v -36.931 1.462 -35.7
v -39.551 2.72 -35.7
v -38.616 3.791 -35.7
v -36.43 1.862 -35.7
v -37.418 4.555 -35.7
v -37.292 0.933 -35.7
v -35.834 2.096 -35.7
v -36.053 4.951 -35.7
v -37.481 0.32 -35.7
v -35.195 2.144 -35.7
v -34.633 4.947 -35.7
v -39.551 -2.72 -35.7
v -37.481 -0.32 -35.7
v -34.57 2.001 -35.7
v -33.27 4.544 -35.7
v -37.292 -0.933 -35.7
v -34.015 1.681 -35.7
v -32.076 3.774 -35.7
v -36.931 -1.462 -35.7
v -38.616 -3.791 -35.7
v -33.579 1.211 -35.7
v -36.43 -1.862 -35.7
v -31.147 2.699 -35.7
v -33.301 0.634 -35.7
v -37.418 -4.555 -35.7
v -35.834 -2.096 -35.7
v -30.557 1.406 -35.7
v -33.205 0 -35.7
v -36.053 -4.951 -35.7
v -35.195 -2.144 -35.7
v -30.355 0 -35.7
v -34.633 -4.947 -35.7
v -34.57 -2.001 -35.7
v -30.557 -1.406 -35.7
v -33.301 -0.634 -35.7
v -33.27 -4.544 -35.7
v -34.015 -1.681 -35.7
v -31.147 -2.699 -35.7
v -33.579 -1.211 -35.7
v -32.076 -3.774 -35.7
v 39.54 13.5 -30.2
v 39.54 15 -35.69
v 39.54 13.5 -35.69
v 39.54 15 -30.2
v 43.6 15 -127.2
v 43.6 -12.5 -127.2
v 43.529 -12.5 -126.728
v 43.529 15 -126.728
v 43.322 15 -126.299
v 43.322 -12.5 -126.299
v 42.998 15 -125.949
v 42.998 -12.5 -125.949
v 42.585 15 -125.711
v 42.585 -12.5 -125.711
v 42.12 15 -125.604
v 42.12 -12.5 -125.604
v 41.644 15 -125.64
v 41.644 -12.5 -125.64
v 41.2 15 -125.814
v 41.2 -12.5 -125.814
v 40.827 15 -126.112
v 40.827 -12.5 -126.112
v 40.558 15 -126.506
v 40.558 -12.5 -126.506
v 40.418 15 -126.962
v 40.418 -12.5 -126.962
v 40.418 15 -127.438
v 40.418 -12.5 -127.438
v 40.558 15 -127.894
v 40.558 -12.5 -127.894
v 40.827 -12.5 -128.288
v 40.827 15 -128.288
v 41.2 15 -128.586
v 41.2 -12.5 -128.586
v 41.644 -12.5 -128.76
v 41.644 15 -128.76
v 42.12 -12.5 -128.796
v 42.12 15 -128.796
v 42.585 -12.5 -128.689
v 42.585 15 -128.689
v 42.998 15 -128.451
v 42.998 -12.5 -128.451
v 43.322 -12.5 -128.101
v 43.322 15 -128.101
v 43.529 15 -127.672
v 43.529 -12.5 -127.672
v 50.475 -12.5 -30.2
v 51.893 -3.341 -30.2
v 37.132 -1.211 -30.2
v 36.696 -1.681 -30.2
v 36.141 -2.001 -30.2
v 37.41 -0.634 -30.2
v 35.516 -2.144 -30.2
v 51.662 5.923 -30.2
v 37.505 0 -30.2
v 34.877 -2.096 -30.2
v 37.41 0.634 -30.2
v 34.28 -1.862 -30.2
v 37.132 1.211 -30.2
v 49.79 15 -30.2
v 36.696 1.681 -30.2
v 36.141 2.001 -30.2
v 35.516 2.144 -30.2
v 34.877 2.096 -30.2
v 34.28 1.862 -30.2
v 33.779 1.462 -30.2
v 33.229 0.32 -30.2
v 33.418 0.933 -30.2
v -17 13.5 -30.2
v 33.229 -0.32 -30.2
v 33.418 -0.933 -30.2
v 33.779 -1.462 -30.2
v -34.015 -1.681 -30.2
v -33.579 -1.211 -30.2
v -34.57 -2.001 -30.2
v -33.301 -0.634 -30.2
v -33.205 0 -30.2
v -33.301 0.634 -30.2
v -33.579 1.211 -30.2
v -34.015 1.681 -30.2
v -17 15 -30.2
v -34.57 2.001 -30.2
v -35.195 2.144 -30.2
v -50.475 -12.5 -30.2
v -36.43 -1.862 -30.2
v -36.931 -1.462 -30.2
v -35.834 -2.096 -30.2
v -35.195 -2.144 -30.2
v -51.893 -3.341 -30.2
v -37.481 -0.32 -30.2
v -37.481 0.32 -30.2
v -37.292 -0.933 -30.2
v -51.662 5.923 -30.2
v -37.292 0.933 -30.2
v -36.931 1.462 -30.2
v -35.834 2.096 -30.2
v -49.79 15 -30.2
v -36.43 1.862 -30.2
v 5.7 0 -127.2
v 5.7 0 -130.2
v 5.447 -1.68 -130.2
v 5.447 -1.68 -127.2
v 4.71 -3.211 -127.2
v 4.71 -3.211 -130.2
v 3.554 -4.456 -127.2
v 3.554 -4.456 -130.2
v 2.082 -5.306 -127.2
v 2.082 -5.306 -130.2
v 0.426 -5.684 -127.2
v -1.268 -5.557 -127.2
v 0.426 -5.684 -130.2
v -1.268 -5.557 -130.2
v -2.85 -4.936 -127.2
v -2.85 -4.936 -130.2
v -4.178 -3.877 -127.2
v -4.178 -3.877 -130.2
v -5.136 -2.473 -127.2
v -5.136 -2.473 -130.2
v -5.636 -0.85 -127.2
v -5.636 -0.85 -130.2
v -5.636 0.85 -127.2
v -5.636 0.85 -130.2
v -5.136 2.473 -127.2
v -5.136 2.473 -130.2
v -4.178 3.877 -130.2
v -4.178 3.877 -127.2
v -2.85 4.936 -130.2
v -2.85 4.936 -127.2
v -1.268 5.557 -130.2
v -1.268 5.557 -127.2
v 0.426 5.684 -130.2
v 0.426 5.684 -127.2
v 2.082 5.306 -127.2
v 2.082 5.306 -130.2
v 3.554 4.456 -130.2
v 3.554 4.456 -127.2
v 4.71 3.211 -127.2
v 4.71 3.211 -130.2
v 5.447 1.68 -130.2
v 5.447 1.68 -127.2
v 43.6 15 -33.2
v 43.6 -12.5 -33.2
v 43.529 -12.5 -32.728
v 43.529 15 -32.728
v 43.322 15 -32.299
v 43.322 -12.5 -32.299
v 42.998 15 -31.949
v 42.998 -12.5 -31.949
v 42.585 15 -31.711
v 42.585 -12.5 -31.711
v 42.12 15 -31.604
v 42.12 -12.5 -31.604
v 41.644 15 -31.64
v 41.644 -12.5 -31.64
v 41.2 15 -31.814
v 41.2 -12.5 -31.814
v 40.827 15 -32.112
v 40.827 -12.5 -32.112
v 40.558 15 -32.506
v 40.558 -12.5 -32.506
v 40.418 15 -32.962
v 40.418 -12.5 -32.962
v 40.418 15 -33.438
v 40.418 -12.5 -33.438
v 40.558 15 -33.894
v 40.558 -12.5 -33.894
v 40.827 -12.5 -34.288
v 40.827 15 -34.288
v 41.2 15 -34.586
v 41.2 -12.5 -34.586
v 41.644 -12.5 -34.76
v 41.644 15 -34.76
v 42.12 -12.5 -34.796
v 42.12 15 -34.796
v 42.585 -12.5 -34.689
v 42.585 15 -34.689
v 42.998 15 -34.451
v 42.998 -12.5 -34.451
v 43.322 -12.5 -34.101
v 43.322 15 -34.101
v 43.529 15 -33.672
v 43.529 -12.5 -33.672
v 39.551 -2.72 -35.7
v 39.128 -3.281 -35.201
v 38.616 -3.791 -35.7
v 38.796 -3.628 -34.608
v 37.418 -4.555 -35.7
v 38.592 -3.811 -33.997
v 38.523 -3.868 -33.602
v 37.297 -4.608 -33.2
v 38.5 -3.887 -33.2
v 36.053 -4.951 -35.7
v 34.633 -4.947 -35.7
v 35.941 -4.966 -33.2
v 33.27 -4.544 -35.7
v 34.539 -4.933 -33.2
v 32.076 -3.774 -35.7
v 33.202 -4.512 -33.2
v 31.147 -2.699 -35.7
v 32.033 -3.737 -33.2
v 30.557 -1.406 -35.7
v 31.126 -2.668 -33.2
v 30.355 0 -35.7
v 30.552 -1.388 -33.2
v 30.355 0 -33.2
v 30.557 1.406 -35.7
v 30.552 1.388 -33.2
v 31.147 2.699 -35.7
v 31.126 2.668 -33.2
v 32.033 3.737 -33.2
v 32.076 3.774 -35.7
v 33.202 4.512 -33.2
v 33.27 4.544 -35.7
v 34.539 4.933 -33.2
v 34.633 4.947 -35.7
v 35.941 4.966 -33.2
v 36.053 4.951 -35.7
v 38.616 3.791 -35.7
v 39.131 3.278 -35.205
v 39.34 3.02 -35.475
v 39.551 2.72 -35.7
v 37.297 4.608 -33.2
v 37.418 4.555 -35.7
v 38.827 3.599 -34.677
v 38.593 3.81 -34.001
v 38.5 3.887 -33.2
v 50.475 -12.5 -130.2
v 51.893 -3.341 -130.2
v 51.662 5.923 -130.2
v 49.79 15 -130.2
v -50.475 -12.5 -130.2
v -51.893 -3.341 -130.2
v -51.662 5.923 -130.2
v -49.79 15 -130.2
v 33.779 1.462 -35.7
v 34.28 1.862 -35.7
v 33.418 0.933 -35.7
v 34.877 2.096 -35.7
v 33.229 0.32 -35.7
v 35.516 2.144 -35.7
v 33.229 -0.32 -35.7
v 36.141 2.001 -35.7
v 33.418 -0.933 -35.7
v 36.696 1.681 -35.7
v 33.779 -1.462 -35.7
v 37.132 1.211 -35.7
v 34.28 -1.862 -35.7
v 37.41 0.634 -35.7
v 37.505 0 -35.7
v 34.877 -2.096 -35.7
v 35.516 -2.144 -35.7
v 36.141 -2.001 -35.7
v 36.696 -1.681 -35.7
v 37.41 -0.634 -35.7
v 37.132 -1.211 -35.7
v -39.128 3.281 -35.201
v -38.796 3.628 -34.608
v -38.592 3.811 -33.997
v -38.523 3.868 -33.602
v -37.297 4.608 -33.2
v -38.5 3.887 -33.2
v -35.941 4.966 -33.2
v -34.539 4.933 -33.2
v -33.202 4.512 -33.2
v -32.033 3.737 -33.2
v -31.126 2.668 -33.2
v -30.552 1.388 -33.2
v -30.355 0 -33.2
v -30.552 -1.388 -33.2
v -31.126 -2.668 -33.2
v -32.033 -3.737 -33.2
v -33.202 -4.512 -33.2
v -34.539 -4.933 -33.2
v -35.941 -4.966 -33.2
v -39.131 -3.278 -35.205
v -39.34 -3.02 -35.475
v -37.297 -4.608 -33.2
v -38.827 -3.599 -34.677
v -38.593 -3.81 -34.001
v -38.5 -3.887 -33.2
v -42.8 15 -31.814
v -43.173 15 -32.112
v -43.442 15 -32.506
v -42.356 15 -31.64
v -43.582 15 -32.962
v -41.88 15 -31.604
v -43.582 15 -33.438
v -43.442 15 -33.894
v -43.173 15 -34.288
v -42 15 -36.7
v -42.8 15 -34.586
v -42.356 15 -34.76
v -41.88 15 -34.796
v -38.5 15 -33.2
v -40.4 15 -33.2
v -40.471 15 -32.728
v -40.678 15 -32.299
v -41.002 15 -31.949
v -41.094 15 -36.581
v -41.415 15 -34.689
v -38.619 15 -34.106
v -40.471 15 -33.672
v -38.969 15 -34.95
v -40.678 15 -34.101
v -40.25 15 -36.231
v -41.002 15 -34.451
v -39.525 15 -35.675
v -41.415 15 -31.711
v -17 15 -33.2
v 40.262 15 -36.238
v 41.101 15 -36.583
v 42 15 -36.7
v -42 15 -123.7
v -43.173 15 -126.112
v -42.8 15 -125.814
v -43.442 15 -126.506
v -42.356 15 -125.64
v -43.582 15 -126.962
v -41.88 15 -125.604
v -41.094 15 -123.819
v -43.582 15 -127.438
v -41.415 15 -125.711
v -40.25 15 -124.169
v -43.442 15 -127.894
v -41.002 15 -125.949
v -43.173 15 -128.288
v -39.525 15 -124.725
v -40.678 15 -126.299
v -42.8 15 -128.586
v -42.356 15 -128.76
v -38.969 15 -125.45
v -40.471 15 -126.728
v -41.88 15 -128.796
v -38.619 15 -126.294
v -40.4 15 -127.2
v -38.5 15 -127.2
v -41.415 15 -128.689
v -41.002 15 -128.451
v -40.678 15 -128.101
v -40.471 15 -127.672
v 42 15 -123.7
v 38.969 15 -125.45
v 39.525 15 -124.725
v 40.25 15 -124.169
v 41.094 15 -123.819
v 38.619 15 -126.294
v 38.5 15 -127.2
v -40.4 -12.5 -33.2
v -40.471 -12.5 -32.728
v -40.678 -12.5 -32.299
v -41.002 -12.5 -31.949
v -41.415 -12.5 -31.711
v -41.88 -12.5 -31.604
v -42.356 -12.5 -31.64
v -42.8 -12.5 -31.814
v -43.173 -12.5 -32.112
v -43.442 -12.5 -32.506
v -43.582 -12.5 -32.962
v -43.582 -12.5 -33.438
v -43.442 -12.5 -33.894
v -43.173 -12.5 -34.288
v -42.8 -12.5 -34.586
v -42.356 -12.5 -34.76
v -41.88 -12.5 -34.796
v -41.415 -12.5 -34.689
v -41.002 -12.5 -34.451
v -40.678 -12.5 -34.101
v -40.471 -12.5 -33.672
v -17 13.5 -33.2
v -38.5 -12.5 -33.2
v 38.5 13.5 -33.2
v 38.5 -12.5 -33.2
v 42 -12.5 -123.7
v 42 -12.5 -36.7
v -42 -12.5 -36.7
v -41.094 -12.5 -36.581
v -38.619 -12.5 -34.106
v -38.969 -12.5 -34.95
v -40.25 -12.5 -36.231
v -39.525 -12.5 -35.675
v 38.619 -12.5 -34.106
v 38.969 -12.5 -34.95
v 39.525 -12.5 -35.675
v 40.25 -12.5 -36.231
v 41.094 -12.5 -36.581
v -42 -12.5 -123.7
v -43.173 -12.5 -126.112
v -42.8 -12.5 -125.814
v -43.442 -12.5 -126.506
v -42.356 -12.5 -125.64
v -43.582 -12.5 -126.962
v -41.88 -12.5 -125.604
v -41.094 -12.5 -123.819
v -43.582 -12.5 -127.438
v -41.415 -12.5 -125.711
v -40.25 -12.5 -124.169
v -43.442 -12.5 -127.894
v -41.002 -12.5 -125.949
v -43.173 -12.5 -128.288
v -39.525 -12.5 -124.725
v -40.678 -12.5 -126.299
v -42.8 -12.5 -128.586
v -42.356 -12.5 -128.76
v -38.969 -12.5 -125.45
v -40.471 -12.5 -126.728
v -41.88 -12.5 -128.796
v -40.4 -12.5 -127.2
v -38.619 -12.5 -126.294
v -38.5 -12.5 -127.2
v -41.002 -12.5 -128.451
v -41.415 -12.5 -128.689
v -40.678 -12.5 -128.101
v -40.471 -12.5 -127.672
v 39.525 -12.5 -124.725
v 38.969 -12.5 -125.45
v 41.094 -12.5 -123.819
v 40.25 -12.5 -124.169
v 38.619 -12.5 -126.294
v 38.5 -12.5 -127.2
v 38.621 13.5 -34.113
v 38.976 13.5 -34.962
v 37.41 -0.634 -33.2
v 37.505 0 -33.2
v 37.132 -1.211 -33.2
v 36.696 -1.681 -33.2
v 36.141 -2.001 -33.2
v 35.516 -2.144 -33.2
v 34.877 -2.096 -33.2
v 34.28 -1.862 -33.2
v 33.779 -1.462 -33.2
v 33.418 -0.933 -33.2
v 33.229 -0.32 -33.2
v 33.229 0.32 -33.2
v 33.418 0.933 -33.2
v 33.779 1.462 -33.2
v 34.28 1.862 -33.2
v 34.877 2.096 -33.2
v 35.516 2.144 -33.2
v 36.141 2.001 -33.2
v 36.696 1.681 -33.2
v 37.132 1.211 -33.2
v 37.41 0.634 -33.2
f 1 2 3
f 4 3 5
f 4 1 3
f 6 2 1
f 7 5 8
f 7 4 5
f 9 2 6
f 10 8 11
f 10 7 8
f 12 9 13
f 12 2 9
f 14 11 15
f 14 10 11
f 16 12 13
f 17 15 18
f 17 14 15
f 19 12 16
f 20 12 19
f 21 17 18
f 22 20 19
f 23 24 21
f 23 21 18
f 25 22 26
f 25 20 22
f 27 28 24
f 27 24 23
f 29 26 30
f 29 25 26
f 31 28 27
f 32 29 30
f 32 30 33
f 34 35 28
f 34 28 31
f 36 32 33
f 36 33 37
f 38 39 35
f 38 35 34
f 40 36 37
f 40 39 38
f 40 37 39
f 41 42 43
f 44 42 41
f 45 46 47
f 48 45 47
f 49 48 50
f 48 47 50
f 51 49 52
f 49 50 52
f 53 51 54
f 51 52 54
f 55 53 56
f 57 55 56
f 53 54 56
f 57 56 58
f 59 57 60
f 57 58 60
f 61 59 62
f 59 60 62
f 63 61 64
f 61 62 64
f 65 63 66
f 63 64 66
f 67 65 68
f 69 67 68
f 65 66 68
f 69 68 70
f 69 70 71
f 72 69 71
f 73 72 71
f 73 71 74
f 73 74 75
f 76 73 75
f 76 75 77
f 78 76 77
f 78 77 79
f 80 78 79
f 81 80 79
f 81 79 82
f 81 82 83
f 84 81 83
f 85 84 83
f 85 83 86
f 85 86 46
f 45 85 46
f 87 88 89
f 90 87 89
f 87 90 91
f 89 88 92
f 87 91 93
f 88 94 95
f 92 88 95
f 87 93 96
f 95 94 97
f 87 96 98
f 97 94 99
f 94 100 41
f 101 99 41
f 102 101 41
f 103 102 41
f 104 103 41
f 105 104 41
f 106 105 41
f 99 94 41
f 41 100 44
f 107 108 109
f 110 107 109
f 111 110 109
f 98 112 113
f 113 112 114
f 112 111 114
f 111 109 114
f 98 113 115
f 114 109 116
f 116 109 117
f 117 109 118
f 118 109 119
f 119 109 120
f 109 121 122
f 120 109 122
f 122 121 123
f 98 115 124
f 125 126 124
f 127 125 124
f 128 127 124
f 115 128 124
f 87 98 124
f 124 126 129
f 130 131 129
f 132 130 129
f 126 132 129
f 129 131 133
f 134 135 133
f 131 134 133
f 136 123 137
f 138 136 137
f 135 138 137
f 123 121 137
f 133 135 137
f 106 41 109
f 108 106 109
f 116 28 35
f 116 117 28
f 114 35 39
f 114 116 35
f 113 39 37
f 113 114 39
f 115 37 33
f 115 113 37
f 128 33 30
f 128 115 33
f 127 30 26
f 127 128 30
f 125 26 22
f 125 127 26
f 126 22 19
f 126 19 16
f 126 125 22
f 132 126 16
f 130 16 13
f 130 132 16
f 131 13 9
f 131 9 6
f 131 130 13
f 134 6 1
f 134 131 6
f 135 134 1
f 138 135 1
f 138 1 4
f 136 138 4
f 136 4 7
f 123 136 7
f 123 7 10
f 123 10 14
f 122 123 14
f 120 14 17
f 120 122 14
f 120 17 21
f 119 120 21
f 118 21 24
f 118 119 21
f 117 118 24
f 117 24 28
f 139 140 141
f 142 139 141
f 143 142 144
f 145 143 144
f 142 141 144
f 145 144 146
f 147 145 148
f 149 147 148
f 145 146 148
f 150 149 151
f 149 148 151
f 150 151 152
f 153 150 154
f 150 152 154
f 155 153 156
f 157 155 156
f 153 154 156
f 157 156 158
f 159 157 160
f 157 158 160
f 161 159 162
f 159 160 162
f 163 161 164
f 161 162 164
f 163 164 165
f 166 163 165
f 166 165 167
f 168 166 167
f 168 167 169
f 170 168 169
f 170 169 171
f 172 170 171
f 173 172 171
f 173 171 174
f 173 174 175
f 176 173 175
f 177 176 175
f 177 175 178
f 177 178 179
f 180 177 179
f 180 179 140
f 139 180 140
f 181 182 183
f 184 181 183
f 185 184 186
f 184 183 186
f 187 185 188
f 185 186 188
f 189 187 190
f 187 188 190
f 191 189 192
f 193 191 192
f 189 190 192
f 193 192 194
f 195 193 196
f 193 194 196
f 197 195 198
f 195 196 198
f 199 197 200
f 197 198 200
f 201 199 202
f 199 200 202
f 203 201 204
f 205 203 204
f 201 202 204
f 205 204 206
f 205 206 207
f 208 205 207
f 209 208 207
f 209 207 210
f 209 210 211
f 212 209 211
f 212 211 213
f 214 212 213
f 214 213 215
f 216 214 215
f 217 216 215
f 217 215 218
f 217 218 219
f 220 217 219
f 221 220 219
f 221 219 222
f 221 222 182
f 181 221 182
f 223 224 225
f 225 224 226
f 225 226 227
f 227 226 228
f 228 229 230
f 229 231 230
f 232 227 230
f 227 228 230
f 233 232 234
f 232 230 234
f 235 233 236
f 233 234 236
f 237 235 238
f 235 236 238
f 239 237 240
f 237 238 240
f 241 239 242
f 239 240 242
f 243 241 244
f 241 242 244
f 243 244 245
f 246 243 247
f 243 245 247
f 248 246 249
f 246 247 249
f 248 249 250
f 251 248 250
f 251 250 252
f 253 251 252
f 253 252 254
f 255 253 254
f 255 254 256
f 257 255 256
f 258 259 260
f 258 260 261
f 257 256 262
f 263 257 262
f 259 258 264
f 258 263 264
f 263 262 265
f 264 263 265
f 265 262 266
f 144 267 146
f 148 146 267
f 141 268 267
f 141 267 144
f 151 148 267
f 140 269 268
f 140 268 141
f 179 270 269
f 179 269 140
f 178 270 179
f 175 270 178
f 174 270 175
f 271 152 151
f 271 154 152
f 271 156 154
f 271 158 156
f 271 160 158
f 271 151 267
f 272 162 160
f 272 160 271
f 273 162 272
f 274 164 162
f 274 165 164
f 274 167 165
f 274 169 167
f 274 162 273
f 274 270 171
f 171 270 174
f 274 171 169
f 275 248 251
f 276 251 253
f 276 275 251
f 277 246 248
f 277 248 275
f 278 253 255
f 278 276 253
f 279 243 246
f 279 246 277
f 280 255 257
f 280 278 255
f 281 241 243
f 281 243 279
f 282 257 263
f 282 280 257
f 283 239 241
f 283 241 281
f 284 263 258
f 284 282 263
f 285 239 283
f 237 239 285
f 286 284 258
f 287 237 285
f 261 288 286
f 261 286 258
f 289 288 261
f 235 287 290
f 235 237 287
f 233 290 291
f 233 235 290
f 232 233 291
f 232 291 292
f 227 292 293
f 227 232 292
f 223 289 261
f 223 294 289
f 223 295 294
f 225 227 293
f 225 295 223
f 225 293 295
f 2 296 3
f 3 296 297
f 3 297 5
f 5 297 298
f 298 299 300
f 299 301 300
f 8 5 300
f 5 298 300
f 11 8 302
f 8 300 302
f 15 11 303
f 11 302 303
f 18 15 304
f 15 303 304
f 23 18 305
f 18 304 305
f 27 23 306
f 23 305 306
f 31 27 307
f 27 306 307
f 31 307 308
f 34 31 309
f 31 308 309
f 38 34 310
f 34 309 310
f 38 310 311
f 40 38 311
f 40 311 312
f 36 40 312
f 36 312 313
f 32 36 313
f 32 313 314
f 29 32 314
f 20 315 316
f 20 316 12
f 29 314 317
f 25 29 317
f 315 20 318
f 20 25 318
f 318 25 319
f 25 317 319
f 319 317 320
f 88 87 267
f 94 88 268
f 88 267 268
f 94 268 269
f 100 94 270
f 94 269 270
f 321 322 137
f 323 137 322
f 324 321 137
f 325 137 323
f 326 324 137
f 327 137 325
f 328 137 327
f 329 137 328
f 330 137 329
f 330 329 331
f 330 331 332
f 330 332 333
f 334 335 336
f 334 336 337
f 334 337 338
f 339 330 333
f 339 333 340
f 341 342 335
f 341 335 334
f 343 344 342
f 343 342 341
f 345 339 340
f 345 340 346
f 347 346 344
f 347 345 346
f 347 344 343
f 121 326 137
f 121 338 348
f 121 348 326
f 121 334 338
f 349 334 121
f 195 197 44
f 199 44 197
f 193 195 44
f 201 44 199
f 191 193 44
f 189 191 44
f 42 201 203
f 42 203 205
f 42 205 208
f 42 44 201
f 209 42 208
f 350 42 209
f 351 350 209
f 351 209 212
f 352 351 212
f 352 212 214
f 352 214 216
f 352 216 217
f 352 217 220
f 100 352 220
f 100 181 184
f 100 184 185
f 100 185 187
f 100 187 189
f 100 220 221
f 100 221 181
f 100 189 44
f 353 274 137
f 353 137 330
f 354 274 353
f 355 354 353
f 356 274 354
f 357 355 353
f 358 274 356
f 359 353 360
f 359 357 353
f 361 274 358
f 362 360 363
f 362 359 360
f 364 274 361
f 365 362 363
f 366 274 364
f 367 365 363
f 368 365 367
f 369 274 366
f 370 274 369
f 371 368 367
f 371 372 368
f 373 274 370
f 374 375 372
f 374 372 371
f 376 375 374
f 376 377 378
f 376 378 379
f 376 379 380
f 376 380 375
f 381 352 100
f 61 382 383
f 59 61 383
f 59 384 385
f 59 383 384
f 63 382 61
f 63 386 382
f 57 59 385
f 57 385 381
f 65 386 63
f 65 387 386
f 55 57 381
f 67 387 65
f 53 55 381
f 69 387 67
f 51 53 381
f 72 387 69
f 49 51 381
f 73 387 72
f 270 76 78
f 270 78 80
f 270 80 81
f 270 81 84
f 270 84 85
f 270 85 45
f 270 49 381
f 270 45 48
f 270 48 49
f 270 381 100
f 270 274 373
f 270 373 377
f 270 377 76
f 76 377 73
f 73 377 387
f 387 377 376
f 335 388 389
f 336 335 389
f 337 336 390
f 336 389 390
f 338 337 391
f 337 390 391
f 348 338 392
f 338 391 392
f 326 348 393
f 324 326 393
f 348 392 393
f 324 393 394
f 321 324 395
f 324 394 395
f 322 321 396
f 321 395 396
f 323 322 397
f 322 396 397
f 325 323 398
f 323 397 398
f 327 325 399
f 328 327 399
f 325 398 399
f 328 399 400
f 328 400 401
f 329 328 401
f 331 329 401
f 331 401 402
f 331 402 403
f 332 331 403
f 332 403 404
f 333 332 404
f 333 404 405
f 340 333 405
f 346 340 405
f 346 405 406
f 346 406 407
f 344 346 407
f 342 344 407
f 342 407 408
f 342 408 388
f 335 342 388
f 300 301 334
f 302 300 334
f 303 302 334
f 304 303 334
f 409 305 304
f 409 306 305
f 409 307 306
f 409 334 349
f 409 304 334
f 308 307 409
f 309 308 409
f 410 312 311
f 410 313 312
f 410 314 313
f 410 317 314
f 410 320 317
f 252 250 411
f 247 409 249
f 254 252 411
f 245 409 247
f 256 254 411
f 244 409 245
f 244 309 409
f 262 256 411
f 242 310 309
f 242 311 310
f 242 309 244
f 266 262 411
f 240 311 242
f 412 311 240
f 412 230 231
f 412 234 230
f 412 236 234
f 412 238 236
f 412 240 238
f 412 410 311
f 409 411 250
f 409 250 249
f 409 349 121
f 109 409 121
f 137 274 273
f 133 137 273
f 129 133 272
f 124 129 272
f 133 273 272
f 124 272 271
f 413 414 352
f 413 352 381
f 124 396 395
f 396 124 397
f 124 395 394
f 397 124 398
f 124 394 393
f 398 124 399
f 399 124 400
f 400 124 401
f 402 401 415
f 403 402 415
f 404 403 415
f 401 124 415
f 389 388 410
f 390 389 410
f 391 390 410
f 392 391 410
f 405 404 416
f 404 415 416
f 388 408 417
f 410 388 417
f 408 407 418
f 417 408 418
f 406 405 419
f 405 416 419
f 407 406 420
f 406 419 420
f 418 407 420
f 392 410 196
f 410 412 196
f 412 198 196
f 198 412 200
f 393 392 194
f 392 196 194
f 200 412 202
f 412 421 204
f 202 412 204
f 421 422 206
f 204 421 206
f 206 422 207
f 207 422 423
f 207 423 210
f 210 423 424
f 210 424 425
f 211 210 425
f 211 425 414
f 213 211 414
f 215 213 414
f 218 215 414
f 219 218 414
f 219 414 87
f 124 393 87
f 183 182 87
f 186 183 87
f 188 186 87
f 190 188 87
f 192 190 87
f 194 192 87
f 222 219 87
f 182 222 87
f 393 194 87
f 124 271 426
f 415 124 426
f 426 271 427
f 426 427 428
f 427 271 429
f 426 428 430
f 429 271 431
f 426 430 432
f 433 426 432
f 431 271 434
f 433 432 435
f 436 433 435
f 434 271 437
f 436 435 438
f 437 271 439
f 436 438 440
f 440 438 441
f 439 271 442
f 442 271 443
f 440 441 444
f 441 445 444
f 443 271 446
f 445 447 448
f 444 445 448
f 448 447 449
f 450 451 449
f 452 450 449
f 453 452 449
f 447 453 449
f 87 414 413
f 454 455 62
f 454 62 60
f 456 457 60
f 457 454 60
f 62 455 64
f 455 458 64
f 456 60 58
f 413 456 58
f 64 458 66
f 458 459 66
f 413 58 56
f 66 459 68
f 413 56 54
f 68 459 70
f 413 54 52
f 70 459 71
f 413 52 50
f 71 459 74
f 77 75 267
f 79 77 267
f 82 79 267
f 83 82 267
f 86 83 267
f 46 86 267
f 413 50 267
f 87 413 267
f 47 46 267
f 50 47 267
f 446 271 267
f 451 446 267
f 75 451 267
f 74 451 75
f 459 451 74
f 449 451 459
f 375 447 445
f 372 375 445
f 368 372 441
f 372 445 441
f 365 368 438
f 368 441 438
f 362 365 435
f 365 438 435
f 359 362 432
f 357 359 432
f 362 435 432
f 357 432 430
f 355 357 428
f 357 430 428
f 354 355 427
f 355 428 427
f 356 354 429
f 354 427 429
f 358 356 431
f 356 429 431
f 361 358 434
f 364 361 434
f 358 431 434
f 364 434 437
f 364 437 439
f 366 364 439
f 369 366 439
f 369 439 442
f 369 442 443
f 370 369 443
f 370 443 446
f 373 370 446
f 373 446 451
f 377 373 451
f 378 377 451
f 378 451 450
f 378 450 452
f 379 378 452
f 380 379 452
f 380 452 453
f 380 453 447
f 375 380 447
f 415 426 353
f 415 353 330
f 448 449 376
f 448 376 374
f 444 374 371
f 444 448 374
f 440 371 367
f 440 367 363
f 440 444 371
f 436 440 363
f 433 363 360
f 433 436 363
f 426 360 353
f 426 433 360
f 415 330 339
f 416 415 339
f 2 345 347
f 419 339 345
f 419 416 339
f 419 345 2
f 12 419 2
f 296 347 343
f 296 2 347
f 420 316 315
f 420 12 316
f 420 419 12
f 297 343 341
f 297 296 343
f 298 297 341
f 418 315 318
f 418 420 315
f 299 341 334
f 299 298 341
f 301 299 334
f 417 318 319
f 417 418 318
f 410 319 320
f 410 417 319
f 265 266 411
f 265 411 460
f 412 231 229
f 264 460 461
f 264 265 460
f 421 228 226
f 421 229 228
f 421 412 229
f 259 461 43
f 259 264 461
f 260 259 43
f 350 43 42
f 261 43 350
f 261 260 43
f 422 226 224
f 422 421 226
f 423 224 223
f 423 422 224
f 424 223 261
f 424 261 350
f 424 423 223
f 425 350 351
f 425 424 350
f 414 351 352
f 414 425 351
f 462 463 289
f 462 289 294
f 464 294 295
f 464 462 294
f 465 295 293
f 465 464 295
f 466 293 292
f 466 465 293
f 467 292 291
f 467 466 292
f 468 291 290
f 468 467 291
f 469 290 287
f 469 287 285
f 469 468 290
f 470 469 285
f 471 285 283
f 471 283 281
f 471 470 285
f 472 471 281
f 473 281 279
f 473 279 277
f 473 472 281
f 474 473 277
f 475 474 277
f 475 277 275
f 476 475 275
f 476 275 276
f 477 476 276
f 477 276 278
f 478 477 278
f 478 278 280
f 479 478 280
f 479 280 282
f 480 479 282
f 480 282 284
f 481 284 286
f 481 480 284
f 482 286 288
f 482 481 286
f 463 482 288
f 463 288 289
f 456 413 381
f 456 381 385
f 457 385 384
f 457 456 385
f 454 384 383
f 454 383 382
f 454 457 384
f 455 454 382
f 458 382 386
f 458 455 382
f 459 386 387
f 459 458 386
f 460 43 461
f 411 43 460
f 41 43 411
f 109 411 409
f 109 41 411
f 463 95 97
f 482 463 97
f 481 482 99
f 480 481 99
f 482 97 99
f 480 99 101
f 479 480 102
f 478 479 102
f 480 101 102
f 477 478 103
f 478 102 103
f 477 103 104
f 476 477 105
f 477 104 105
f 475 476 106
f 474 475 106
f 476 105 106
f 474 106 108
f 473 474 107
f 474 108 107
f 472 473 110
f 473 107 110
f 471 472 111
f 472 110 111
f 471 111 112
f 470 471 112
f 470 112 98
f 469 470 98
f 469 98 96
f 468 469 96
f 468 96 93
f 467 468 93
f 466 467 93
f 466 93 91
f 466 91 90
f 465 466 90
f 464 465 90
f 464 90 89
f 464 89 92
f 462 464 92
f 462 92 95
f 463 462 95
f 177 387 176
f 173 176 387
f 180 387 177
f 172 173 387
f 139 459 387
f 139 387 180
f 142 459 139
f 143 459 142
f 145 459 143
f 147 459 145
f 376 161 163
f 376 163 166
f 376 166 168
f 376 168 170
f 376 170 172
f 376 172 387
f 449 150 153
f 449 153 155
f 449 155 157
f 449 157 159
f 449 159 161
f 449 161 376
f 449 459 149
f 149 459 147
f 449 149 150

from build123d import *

# Parameters (mm, degrees)
PAD005_DEPTH    = 100
SKETCH007_R     = 1.6
POCKET001_DEPTH = 27.501
SKETCH008_R     = 2.15
POCKET002_DEPTH = 50
SKETCH014_R     = 5
SKETCH014_R_2   = 2.15
PAD010_DEPTH    = 2.5
SKETCH019_W     = 56.540354
SKETCH019_H     = 5.490008
POCKET_DEPTH    = 1.5
SKETCH020_R     = 5.7
POCKET004_DEPTH = 10


with BuildPart() as part:
    # Sketch006 → Pad005 (new body)
    with BuildSketch(Plane.XY):
        with BuildLine():
            Line((-49.789557, 15), (49.789557, 15))
            ThreePointArc((50.475241, -12.5), (51.983843, 1.296164), (49.789557, 15))
            Line((-50.475241, -12.5), (50.475241, -12.5))
            ThreePointArc((-49.789557, 15), (-51.983843, 1.296164), (-50.475241, -12.5))
        make_face()
    extrude(amount=PAD005_DEPTH)

    # Sketch007 (on Face3 of Pad005) → Pocket001 (cut, through all)
    with BuildSketch(Plane.XZ.offset(12.5)):
        with Locations((-42, 97)):
            Circle(SKETCH007_R)
        with Locations((42, 97)):
            Circle(SKETCH007_R)
        with Locations((42, 3)):
            Circle(SKETCH007_R)
        with Locations((-42, 3)):
            Circle(SKETCH007_R)
        with BuildLine():
            ThreePointArc((-42, 93.5), (-39.525126, 94.525126), (-38.5, 97))
            Line((-38.5, 97), (38.5, 97))
            ThreePointArc((38.5, 97), (39.525126, 94.525126), (42, 93.5))
            Line((42, 93.5), (42, 6.5))
            ThreePointArc((42, 6.5), (39.525126, 5.474874), (38.5, 3))
            Line((38.5, 3), (-38.5, 3))
            ThreePointArc((-38.5, 3), (-39.525126, 5.474874), (-42, 6.5))
            Line((-42, 6.5), (-42, 93.5))
        make_face()
    extrude(amount=-POCKET001_DEPTH, mode=Mode.SUBTRACT)

    # Sketch008 (on Face4 of Pocket001) → Pocket002 (cut)
    with BuildSketch(Plane.XY.offset(100)):
        with Locations((-35.355339, 0)):
            Circle(SKETCH008_R)
        with Locations((35.355339, 0)):
            Circle(SKETCH008_R)
    extrude(amount=-POCKET002_DEPTH, mode=Mode.SUBTRACT)

    # Sketch014 (on Face10 of Pocket002) → Pad010 (join)
    with BuildSketch(Plane(origin=(0, 0, 97), x_dir=(1, 0, 0), z_dir=(0, 0, -1))):
        with Locations((-35.355339, 0)):
            Circle(SKETCH014_R)
        with Locations((-35.355339, 0)):
            Circle(SKETCH014_R_2, mode=Mode.SUBTRACT)
        with Locations((35.355339, 0)):
            Circle(SKETCH014_R)
        with Locations((35.355339, 0)):
            Circle(SKETCH014_R_2, mode=Mode.SUBTRACT)
    extrude(amount=PAD010_DEPTH)

    # Sketch019 (on Face1 of Pad010) → Pocket (cut)
    with BuildSketch(Plane(origin=(0, 15, 0), x_dir=(-1, 0, 0), z_dir=(0, 1, 0))):
        with Locations((-11.270177, 97.254996)):
            Rectangle(SKETCH019_W, SKETCH019_H)
    extrude(amount=-POCKET_DEPTH, mode=Mode.SUBTRACT)

    # Sketch020 (on Face2 of Pocket) → Pocket004 (cut)
    with BuildSketch(Plane(origin=(0, 0, 0), x_dir=(1, 0, 0), z_dir=(0, 0, -1))):
        Circle(SKETCH020_R)
    extrude(amount=-POCKET004_DEPTH, mode=Mode.SUBTRACT)


with BuildPart() as part_1:
    # Body006 placement: moved
    add(part.part.moved(Location((0, 0, -130.2))))


solid = part_1.part
